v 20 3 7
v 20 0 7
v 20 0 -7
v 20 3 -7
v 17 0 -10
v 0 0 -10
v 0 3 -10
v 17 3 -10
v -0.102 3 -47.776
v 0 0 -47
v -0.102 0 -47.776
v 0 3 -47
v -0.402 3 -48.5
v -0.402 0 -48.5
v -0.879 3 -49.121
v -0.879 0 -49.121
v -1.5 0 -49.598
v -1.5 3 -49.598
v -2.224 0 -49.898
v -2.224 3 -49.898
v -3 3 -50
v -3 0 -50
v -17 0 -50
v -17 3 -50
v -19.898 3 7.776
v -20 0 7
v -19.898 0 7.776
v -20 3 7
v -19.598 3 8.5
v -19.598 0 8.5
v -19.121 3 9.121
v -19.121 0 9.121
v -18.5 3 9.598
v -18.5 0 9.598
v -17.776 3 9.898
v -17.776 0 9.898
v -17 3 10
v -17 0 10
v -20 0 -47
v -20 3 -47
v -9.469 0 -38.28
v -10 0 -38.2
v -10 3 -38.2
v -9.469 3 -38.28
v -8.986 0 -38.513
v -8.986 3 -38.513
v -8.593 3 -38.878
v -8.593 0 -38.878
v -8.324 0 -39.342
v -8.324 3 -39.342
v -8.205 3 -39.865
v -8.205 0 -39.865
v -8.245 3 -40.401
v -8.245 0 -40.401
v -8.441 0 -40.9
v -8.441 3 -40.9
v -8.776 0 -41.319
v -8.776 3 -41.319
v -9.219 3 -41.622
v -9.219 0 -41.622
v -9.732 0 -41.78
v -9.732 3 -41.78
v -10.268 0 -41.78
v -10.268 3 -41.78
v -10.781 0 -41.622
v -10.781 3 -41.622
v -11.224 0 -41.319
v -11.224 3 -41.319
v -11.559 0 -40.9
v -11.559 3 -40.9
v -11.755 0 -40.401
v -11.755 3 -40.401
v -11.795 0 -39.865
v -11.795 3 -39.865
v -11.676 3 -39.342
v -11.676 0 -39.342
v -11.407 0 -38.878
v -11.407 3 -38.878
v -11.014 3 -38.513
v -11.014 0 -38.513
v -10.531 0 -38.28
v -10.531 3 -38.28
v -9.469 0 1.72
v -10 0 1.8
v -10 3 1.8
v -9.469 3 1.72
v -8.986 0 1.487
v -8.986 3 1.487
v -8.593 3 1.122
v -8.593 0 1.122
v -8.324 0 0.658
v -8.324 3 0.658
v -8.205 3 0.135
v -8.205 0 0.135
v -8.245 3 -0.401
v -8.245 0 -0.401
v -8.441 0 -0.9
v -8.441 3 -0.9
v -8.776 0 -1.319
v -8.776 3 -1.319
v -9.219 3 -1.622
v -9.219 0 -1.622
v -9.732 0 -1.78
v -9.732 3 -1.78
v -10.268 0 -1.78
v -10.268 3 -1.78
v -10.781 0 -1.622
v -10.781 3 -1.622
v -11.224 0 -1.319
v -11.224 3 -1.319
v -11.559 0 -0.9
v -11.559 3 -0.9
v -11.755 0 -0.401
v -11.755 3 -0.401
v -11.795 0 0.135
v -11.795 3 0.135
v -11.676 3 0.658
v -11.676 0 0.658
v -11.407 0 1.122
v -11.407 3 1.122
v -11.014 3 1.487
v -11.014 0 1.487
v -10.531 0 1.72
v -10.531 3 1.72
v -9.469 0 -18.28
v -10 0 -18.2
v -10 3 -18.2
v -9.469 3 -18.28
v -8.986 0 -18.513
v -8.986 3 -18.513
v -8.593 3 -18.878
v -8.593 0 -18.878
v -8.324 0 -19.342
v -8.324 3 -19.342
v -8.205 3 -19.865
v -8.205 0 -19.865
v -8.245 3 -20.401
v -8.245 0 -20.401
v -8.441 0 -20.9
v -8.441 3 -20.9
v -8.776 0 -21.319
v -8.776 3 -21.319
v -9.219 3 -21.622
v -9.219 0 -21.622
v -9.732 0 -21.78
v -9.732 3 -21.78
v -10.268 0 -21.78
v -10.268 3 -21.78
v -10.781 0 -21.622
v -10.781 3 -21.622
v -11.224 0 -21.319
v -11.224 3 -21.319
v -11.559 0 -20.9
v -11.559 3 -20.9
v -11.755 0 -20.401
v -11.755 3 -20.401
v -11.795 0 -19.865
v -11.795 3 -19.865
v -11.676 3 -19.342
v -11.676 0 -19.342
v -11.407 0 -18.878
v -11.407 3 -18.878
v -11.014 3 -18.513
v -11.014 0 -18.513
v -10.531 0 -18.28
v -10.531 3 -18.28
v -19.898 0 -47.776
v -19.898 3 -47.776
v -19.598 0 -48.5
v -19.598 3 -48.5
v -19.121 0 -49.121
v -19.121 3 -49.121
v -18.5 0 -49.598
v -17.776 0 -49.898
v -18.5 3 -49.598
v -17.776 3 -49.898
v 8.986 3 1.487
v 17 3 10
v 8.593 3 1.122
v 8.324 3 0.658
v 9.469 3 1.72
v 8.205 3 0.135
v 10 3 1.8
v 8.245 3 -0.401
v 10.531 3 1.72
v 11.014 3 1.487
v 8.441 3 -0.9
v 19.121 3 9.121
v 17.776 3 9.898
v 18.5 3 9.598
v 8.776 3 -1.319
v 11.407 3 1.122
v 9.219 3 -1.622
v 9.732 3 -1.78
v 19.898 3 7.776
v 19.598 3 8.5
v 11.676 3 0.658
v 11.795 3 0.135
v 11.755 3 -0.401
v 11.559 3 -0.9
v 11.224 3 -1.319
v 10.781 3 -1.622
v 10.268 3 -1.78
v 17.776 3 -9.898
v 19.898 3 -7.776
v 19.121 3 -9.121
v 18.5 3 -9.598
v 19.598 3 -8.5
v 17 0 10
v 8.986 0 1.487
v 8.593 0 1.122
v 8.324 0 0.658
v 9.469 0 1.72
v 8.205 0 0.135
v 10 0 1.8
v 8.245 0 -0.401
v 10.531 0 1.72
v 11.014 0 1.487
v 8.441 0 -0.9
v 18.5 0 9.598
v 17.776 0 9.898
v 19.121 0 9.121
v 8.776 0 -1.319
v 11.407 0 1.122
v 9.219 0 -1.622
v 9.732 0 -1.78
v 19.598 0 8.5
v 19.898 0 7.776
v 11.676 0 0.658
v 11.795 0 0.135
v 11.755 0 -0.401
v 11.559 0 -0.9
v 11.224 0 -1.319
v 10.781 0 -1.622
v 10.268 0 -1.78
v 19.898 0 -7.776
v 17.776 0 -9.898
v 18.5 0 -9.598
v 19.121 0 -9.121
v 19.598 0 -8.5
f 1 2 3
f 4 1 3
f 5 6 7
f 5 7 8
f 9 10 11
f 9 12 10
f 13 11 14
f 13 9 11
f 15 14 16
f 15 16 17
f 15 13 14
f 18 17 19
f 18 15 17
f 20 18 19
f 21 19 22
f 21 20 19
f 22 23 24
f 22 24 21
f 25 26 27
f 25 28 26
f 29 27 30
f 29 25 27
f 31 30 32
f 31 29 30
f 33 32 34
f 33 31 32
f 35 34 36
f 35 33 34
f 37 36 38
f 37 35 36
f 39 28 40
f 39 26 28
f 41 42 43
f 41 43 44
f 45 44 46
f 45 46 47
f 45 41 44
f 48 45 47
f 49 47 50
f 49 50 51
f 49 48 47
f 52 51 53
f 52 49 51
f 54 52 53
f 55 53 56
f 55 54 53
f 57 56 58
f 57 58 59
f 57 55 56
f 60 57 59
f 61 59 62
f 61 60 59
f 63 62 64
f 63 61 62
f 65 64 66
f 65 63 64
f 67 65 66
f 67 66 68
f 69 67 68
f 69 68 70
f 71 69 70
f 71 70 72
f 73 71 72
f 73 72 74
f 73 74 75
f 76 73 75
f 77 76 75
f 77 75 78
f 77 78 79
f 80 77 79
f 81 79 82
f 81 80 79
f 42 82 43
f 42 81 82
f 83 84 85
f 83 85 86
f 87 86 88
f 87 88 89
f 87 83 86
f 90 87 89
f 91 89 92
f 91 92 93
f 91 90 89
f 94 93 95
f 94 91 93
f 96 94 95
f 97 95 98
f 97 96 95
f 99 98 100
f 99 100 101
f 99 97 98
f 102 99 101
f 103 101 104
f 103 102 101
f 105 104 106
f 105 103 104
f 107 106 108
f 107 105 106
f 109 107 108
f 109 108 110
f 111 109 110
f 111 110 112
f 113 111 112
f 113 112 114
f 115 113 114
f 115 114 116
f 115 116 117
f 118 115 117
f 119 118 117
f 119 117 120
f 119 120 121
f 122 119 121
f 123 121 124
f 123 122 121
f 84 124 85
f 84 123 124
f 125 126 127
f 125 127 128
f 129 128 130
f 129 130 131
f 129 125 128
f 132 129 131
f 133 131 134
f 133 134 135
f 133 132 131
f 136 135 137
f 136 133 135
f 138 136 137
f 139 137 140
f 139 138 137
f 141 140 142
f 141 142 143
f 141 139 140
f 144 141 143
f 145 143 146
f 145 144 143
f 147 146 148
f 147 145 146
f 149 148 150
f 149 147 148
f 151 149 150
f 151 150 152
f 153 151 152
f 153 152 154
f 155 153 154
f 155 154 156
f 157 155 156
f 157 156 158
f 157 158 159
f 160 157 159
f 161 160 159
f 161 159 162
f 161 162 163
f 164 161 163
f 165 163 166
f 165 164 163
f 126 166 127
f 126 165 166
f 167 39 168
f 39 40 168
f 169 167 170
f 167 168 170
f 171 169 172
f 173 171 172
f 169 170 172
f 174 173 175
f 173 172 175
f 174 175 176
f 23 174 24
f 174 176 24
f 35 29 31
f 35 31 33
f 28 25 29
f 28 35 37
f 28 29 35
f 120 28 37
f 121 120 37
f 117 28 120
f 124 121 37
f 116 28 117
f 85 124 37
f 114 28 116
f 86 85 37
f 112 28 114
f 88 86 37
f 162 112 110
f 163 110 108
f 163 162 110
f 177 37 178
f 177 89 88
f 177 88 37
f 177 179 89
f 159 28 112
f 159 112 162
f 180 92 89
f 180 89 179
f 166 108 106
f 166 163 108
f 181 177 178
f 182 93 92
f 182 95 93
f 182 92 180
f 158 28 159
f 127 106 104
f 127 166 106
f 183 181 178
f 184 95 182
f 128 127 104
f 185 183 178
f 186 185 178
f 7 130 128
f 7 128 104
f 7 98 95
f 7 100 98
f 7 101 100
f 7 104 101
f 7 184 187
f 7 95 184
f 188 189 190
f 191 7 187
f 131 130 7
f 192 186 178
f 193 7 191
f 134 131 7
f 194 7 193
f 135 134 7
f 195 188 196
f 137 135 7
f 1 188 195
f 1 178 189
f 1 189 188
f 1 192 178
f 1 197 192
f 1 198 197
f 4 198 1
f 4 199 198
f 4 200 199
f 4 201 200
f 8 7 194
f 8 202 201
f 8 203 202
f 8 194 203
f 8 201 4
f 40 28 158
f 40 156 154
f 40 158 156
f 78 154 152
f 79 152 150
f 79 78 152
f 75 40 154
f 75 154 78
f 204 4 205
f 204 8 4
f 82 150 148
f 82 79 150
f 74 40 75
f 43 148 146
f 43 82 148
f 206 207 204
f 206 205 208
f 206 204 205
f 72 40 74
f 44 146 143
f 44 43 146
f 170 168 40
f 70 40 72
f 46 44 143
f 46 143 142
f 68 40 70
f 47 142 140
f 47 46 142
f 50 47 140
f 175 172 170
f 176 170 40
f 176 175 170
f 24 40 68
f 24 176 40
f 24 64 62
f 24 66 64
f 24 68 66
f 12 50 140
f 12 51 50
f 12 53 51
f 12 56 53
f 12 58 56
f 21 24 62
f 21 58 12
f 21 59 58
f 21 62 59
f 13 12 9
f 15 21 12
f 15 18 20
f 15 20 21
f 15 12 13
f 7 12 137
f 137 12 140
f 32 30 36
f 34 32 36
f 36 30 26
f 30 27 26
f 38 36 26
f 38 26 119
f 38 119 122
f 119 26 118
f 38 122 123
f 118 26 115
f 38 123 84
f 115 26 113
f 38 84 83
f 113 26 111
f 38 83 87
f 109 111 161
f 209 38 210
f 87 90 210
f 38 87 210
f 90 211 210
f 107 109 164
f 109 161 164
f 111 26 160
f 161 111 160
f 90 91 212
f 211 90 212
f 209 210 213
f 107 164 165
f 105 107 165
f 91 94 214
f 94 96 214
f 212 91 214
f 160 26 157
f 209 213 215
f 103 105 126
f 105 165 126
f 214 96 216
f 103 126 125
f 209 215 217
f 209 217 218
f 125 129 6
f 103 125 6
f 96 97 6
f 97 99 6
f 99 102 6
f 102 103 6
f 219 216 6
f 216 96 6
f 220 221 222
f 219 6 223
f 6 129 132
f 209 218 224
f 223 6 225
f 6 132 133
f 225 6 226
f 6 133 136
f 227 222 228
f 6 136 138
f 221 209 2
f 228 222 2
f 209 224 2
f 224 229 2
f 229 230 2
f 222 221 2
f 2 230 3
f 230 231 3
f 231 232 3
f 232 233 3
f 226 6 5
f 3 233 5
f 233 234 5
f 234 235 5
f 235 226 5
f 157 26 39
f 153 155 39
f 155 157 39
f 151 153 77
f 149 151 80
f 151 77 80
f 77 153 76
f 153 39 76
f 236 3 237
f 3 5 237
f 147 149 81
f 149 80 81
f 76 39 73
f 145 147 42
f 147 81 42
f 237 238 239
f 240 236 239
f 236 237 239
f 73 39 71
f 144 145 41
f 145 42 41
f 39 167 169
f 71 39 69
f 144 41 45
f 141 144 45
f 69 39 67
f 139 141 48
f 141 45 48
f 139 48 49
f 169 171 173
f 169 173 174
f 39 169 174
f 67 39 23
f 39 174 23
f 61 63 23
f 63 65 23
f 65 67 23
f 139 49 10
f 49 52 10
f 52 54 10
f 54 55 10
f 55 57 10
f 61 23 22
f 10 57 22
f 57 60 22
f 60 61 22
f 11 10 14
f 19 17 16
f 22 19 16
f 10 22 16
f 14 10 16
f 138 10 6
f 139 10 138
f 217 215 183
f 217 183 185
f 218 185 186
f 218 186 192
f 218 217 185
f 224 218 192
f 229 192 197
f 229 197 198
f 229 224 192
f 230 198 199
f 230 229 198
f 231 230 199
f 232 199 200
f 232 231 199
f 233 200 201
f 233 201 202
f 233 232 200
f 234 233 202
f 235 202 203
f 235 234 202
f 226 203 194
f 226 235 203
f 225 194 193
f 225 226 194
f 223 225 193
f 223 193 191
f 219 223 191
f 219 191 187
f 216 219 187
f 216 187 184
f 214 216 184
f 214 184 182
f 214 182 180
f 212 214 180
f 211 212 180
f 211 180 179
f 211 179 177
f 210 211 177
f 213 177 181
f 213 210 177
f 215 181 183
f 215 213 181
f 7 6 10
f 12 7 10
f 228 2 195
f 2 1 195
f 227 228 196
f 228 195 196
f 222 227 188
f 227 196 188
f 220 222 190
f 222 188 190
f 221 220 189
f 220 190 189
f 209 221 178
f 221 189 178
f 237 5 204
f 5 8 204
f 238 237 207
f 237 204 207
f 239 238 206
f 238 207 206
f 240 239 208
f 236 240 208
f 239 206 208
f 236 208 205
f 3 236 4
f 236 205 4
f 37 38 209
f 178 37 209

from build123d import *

# Parameters (mm, degrees)
SKETCH_1_W      = 20
SKETCH_1_H      = 40
SKETCH_1_R      = 1.8
SKETCH_1_W_2    = 40
SKETCH_1_H_2    = 20
EXTRUDE_1_DEPTH = 3
FILLET_1_R      = 3


with BuildPart() as part:
    # 草图1 → 凸台-拉伸1 (new body)
    # profile 1 of 2: a face of its own
    with BuildSketch(Plane(origin=(0, 0, 0), x_dir=(1, 0, 0), z_dir=(0, 1, 0))):
        with Locations((-10, 30)):
            Rectangle(SKETCH_1_W, SKETCH_1_H)
        with Locations(Location((-10, 20, 0), (0, 0, 270))):
            Circle(SKETCH_1_R, mode=Mode.SUBTRACT)
        with Locations(Location((-10, 40, 0), (0, 0, 270))):
            Circle(SKETCH_1_R, mode=Mode.SUBTRACT)
    # profile 2 of 2: a face of its own
    with BuildSketch(Plane(origin=(0, 0, 0), x_dir=(1, 0, 0), z_dir=(0, 1, 0))):
        Rectangle(SKETCH_1_W_2, SKETCH_1_H_2)
        with Locations(Location((10, 0, 0), (0, 0, 270))):
            Circle(SKETCH_1_R, mode=Mode.SUBTRACT)
        with Locations(Location((-10, 0, 0), (0, 0, 270))):
            Circle(SKETCH_1_R, mode=Mode.SUBTRACT)
    extrude(amount=EXTRUDE_1_DEPTH)

    # 圆角1
    fillet_1_edges = [part.edges().sort_by_distance(p)[0] for p in [
        (-20, 1.5, -50),
        (0, 1.5, -50),
        (20, 1.5, -10),
        (20, 1.5, 10),
        (-20, 1.5, 10),
    ]]
    fillet(fillet_1_edges, radius=FILLET_1_R)


solid = part.part
